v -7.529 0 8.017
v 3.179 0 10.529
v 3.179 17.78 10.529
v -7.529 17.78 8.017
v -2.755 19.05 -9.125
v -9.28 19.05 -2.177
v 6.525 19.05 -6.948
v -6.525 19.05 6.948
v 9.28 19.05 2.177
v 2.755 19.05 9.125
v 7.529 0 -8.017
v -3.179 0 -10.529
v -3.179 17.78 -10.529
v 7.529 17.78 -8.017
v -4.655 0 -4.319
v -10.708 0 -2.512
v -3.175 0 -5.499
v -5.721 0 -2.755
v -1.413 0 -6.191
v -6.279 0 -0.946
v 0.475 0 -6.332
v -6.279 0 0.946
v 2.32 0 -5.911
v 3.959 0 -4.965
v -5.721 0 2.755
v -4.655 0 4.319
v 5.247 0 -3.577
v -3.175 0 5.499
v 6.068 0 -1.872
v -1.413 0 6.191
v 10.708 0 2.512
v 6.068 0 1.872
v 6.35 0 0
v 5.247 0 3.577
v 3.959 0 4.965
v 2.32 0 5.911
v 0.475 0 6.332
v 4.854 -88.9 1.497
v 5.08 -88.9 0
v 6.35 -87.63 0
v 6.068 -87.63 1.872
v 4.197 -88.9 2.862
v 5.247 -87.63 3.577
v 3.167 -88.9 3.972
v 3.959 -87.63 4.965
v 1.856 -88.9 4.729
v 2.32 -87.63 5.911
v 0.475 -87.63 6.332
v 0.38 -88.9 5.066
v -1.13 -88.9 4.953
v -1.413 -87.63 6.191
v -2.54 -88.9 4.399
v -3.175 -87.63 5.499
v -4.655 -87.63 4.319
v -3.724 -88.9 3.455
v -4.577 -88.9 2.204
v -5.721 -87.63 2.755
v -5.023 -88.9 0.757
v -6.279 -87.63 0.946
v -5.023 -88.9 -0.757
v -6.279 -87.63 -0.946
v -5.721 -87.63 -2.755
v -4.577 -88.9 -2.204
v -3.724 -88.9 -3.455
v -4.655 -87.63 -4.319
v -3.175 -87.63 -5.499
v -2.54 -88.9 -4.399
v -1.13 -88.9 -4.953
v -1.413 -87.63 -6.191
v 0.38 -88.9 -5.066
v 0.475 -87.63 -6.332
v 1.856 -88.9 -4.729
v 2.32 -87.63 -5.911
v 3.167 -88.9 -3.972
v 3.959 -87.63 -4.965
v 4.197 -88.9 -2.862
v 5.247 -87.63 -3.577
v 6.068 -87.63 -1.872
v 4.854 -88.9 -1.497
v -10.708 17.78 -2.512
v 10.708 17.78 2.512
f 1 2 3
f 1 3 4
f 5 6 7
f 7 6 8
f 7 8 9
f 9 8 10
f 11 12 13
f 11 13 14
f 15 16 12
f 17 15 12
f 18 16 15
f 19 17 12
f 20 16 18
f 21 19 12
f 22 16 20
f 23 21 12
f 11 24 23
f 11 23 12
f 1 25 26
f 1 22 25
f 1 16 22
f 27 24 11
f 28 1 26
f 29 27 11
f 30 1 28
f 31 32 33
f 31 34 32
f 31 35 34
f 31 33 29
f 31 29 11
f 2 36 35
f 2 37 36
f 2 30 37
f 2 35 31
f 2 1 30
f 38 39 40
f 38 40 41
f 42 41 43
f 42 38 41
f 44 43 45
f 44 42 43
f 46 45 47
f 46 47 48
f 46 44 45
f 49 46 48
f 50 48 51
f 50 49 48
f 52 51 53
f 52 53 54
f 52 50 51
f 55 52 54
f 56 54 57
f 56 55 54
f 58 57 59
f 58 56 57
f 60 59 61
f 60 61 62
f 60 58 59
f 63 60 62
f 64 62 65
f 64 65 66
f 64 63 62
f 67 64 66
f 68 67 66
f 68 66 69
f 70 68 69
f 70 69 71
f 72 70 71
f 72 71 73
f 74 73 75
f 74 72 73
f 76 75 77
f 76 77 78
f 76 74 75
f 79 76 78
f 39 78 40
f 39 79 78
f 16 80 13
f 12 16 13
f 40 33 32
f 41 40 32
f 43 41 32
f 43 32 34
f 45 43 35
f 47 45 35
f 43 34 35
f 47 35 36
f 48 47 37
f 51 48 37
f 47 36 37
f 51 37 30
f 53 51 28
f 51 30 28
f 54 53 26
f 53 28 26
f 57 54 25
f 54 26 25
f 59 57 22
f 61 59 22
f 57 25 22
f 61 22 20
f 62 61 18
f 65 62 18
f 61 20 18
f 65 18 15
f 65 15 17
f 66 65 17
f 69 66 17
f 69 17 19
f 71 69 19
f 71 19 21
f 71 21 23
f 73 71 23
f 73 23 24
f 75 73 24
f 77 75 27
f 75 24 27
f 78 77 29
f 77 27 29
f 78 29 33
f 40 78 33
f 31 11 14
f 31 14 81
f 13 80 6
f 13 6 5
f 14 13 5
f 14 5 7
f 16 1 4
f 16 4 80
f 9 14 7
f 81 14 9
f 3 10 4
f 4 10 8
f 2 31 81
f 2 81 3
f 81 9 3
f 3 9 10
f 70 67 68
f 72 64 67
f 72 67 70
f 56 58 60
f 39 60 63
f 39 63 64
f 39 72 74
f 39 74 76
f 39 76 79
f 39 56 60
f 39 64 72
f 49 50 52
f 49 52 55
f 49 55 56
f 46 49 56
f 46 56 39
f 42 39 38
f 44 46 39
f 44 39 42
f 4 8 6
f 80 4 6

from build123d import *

# Parameters (mm, degrees)
F1_DEPTH = 19.05
F2_R     = 6.35
F3_DEPTH = 88.9
F4_SIZE  = 1.27


with BuildPart() as f1:
    # F0 (on Front) → F1 (new body)
    with BuildSketch(Plane.XZ):
        Polygon((3.178722, 10.529161), (-7.529159, 8.017435), (-10.707882, -2.511726), (-3.178722, -10.529161), (7.529159, -8.017435), (10.707882, 2.511726), align=None)
    extrude(amount=-F1_DEPTH)

    # F2 (on Front) → F3 (join)
    with BuildSketch(Plane.XZ):
        Circle(F2_R)
    extrude(amount=F3_DEPTH)

    # F4
    f4_edges = [f1.edges().sort_by_distance(p)[0] for p in [
        (-6.35, -88.9, 0),
        (-9.118521, 19.05, 2.752854),
        (-2.175218, 19.05, 9.273298),
        (-6.943302, 19.05, -6.520443),
        (2.175218, 19.05, -9.273298),
        (9.118521, 19.05, -2.752854),
        (6.943302, 19.05, 6.520443),
    ]]
    chamfer(f4_edges, length=F4_SIZE)


solid = f1.part
